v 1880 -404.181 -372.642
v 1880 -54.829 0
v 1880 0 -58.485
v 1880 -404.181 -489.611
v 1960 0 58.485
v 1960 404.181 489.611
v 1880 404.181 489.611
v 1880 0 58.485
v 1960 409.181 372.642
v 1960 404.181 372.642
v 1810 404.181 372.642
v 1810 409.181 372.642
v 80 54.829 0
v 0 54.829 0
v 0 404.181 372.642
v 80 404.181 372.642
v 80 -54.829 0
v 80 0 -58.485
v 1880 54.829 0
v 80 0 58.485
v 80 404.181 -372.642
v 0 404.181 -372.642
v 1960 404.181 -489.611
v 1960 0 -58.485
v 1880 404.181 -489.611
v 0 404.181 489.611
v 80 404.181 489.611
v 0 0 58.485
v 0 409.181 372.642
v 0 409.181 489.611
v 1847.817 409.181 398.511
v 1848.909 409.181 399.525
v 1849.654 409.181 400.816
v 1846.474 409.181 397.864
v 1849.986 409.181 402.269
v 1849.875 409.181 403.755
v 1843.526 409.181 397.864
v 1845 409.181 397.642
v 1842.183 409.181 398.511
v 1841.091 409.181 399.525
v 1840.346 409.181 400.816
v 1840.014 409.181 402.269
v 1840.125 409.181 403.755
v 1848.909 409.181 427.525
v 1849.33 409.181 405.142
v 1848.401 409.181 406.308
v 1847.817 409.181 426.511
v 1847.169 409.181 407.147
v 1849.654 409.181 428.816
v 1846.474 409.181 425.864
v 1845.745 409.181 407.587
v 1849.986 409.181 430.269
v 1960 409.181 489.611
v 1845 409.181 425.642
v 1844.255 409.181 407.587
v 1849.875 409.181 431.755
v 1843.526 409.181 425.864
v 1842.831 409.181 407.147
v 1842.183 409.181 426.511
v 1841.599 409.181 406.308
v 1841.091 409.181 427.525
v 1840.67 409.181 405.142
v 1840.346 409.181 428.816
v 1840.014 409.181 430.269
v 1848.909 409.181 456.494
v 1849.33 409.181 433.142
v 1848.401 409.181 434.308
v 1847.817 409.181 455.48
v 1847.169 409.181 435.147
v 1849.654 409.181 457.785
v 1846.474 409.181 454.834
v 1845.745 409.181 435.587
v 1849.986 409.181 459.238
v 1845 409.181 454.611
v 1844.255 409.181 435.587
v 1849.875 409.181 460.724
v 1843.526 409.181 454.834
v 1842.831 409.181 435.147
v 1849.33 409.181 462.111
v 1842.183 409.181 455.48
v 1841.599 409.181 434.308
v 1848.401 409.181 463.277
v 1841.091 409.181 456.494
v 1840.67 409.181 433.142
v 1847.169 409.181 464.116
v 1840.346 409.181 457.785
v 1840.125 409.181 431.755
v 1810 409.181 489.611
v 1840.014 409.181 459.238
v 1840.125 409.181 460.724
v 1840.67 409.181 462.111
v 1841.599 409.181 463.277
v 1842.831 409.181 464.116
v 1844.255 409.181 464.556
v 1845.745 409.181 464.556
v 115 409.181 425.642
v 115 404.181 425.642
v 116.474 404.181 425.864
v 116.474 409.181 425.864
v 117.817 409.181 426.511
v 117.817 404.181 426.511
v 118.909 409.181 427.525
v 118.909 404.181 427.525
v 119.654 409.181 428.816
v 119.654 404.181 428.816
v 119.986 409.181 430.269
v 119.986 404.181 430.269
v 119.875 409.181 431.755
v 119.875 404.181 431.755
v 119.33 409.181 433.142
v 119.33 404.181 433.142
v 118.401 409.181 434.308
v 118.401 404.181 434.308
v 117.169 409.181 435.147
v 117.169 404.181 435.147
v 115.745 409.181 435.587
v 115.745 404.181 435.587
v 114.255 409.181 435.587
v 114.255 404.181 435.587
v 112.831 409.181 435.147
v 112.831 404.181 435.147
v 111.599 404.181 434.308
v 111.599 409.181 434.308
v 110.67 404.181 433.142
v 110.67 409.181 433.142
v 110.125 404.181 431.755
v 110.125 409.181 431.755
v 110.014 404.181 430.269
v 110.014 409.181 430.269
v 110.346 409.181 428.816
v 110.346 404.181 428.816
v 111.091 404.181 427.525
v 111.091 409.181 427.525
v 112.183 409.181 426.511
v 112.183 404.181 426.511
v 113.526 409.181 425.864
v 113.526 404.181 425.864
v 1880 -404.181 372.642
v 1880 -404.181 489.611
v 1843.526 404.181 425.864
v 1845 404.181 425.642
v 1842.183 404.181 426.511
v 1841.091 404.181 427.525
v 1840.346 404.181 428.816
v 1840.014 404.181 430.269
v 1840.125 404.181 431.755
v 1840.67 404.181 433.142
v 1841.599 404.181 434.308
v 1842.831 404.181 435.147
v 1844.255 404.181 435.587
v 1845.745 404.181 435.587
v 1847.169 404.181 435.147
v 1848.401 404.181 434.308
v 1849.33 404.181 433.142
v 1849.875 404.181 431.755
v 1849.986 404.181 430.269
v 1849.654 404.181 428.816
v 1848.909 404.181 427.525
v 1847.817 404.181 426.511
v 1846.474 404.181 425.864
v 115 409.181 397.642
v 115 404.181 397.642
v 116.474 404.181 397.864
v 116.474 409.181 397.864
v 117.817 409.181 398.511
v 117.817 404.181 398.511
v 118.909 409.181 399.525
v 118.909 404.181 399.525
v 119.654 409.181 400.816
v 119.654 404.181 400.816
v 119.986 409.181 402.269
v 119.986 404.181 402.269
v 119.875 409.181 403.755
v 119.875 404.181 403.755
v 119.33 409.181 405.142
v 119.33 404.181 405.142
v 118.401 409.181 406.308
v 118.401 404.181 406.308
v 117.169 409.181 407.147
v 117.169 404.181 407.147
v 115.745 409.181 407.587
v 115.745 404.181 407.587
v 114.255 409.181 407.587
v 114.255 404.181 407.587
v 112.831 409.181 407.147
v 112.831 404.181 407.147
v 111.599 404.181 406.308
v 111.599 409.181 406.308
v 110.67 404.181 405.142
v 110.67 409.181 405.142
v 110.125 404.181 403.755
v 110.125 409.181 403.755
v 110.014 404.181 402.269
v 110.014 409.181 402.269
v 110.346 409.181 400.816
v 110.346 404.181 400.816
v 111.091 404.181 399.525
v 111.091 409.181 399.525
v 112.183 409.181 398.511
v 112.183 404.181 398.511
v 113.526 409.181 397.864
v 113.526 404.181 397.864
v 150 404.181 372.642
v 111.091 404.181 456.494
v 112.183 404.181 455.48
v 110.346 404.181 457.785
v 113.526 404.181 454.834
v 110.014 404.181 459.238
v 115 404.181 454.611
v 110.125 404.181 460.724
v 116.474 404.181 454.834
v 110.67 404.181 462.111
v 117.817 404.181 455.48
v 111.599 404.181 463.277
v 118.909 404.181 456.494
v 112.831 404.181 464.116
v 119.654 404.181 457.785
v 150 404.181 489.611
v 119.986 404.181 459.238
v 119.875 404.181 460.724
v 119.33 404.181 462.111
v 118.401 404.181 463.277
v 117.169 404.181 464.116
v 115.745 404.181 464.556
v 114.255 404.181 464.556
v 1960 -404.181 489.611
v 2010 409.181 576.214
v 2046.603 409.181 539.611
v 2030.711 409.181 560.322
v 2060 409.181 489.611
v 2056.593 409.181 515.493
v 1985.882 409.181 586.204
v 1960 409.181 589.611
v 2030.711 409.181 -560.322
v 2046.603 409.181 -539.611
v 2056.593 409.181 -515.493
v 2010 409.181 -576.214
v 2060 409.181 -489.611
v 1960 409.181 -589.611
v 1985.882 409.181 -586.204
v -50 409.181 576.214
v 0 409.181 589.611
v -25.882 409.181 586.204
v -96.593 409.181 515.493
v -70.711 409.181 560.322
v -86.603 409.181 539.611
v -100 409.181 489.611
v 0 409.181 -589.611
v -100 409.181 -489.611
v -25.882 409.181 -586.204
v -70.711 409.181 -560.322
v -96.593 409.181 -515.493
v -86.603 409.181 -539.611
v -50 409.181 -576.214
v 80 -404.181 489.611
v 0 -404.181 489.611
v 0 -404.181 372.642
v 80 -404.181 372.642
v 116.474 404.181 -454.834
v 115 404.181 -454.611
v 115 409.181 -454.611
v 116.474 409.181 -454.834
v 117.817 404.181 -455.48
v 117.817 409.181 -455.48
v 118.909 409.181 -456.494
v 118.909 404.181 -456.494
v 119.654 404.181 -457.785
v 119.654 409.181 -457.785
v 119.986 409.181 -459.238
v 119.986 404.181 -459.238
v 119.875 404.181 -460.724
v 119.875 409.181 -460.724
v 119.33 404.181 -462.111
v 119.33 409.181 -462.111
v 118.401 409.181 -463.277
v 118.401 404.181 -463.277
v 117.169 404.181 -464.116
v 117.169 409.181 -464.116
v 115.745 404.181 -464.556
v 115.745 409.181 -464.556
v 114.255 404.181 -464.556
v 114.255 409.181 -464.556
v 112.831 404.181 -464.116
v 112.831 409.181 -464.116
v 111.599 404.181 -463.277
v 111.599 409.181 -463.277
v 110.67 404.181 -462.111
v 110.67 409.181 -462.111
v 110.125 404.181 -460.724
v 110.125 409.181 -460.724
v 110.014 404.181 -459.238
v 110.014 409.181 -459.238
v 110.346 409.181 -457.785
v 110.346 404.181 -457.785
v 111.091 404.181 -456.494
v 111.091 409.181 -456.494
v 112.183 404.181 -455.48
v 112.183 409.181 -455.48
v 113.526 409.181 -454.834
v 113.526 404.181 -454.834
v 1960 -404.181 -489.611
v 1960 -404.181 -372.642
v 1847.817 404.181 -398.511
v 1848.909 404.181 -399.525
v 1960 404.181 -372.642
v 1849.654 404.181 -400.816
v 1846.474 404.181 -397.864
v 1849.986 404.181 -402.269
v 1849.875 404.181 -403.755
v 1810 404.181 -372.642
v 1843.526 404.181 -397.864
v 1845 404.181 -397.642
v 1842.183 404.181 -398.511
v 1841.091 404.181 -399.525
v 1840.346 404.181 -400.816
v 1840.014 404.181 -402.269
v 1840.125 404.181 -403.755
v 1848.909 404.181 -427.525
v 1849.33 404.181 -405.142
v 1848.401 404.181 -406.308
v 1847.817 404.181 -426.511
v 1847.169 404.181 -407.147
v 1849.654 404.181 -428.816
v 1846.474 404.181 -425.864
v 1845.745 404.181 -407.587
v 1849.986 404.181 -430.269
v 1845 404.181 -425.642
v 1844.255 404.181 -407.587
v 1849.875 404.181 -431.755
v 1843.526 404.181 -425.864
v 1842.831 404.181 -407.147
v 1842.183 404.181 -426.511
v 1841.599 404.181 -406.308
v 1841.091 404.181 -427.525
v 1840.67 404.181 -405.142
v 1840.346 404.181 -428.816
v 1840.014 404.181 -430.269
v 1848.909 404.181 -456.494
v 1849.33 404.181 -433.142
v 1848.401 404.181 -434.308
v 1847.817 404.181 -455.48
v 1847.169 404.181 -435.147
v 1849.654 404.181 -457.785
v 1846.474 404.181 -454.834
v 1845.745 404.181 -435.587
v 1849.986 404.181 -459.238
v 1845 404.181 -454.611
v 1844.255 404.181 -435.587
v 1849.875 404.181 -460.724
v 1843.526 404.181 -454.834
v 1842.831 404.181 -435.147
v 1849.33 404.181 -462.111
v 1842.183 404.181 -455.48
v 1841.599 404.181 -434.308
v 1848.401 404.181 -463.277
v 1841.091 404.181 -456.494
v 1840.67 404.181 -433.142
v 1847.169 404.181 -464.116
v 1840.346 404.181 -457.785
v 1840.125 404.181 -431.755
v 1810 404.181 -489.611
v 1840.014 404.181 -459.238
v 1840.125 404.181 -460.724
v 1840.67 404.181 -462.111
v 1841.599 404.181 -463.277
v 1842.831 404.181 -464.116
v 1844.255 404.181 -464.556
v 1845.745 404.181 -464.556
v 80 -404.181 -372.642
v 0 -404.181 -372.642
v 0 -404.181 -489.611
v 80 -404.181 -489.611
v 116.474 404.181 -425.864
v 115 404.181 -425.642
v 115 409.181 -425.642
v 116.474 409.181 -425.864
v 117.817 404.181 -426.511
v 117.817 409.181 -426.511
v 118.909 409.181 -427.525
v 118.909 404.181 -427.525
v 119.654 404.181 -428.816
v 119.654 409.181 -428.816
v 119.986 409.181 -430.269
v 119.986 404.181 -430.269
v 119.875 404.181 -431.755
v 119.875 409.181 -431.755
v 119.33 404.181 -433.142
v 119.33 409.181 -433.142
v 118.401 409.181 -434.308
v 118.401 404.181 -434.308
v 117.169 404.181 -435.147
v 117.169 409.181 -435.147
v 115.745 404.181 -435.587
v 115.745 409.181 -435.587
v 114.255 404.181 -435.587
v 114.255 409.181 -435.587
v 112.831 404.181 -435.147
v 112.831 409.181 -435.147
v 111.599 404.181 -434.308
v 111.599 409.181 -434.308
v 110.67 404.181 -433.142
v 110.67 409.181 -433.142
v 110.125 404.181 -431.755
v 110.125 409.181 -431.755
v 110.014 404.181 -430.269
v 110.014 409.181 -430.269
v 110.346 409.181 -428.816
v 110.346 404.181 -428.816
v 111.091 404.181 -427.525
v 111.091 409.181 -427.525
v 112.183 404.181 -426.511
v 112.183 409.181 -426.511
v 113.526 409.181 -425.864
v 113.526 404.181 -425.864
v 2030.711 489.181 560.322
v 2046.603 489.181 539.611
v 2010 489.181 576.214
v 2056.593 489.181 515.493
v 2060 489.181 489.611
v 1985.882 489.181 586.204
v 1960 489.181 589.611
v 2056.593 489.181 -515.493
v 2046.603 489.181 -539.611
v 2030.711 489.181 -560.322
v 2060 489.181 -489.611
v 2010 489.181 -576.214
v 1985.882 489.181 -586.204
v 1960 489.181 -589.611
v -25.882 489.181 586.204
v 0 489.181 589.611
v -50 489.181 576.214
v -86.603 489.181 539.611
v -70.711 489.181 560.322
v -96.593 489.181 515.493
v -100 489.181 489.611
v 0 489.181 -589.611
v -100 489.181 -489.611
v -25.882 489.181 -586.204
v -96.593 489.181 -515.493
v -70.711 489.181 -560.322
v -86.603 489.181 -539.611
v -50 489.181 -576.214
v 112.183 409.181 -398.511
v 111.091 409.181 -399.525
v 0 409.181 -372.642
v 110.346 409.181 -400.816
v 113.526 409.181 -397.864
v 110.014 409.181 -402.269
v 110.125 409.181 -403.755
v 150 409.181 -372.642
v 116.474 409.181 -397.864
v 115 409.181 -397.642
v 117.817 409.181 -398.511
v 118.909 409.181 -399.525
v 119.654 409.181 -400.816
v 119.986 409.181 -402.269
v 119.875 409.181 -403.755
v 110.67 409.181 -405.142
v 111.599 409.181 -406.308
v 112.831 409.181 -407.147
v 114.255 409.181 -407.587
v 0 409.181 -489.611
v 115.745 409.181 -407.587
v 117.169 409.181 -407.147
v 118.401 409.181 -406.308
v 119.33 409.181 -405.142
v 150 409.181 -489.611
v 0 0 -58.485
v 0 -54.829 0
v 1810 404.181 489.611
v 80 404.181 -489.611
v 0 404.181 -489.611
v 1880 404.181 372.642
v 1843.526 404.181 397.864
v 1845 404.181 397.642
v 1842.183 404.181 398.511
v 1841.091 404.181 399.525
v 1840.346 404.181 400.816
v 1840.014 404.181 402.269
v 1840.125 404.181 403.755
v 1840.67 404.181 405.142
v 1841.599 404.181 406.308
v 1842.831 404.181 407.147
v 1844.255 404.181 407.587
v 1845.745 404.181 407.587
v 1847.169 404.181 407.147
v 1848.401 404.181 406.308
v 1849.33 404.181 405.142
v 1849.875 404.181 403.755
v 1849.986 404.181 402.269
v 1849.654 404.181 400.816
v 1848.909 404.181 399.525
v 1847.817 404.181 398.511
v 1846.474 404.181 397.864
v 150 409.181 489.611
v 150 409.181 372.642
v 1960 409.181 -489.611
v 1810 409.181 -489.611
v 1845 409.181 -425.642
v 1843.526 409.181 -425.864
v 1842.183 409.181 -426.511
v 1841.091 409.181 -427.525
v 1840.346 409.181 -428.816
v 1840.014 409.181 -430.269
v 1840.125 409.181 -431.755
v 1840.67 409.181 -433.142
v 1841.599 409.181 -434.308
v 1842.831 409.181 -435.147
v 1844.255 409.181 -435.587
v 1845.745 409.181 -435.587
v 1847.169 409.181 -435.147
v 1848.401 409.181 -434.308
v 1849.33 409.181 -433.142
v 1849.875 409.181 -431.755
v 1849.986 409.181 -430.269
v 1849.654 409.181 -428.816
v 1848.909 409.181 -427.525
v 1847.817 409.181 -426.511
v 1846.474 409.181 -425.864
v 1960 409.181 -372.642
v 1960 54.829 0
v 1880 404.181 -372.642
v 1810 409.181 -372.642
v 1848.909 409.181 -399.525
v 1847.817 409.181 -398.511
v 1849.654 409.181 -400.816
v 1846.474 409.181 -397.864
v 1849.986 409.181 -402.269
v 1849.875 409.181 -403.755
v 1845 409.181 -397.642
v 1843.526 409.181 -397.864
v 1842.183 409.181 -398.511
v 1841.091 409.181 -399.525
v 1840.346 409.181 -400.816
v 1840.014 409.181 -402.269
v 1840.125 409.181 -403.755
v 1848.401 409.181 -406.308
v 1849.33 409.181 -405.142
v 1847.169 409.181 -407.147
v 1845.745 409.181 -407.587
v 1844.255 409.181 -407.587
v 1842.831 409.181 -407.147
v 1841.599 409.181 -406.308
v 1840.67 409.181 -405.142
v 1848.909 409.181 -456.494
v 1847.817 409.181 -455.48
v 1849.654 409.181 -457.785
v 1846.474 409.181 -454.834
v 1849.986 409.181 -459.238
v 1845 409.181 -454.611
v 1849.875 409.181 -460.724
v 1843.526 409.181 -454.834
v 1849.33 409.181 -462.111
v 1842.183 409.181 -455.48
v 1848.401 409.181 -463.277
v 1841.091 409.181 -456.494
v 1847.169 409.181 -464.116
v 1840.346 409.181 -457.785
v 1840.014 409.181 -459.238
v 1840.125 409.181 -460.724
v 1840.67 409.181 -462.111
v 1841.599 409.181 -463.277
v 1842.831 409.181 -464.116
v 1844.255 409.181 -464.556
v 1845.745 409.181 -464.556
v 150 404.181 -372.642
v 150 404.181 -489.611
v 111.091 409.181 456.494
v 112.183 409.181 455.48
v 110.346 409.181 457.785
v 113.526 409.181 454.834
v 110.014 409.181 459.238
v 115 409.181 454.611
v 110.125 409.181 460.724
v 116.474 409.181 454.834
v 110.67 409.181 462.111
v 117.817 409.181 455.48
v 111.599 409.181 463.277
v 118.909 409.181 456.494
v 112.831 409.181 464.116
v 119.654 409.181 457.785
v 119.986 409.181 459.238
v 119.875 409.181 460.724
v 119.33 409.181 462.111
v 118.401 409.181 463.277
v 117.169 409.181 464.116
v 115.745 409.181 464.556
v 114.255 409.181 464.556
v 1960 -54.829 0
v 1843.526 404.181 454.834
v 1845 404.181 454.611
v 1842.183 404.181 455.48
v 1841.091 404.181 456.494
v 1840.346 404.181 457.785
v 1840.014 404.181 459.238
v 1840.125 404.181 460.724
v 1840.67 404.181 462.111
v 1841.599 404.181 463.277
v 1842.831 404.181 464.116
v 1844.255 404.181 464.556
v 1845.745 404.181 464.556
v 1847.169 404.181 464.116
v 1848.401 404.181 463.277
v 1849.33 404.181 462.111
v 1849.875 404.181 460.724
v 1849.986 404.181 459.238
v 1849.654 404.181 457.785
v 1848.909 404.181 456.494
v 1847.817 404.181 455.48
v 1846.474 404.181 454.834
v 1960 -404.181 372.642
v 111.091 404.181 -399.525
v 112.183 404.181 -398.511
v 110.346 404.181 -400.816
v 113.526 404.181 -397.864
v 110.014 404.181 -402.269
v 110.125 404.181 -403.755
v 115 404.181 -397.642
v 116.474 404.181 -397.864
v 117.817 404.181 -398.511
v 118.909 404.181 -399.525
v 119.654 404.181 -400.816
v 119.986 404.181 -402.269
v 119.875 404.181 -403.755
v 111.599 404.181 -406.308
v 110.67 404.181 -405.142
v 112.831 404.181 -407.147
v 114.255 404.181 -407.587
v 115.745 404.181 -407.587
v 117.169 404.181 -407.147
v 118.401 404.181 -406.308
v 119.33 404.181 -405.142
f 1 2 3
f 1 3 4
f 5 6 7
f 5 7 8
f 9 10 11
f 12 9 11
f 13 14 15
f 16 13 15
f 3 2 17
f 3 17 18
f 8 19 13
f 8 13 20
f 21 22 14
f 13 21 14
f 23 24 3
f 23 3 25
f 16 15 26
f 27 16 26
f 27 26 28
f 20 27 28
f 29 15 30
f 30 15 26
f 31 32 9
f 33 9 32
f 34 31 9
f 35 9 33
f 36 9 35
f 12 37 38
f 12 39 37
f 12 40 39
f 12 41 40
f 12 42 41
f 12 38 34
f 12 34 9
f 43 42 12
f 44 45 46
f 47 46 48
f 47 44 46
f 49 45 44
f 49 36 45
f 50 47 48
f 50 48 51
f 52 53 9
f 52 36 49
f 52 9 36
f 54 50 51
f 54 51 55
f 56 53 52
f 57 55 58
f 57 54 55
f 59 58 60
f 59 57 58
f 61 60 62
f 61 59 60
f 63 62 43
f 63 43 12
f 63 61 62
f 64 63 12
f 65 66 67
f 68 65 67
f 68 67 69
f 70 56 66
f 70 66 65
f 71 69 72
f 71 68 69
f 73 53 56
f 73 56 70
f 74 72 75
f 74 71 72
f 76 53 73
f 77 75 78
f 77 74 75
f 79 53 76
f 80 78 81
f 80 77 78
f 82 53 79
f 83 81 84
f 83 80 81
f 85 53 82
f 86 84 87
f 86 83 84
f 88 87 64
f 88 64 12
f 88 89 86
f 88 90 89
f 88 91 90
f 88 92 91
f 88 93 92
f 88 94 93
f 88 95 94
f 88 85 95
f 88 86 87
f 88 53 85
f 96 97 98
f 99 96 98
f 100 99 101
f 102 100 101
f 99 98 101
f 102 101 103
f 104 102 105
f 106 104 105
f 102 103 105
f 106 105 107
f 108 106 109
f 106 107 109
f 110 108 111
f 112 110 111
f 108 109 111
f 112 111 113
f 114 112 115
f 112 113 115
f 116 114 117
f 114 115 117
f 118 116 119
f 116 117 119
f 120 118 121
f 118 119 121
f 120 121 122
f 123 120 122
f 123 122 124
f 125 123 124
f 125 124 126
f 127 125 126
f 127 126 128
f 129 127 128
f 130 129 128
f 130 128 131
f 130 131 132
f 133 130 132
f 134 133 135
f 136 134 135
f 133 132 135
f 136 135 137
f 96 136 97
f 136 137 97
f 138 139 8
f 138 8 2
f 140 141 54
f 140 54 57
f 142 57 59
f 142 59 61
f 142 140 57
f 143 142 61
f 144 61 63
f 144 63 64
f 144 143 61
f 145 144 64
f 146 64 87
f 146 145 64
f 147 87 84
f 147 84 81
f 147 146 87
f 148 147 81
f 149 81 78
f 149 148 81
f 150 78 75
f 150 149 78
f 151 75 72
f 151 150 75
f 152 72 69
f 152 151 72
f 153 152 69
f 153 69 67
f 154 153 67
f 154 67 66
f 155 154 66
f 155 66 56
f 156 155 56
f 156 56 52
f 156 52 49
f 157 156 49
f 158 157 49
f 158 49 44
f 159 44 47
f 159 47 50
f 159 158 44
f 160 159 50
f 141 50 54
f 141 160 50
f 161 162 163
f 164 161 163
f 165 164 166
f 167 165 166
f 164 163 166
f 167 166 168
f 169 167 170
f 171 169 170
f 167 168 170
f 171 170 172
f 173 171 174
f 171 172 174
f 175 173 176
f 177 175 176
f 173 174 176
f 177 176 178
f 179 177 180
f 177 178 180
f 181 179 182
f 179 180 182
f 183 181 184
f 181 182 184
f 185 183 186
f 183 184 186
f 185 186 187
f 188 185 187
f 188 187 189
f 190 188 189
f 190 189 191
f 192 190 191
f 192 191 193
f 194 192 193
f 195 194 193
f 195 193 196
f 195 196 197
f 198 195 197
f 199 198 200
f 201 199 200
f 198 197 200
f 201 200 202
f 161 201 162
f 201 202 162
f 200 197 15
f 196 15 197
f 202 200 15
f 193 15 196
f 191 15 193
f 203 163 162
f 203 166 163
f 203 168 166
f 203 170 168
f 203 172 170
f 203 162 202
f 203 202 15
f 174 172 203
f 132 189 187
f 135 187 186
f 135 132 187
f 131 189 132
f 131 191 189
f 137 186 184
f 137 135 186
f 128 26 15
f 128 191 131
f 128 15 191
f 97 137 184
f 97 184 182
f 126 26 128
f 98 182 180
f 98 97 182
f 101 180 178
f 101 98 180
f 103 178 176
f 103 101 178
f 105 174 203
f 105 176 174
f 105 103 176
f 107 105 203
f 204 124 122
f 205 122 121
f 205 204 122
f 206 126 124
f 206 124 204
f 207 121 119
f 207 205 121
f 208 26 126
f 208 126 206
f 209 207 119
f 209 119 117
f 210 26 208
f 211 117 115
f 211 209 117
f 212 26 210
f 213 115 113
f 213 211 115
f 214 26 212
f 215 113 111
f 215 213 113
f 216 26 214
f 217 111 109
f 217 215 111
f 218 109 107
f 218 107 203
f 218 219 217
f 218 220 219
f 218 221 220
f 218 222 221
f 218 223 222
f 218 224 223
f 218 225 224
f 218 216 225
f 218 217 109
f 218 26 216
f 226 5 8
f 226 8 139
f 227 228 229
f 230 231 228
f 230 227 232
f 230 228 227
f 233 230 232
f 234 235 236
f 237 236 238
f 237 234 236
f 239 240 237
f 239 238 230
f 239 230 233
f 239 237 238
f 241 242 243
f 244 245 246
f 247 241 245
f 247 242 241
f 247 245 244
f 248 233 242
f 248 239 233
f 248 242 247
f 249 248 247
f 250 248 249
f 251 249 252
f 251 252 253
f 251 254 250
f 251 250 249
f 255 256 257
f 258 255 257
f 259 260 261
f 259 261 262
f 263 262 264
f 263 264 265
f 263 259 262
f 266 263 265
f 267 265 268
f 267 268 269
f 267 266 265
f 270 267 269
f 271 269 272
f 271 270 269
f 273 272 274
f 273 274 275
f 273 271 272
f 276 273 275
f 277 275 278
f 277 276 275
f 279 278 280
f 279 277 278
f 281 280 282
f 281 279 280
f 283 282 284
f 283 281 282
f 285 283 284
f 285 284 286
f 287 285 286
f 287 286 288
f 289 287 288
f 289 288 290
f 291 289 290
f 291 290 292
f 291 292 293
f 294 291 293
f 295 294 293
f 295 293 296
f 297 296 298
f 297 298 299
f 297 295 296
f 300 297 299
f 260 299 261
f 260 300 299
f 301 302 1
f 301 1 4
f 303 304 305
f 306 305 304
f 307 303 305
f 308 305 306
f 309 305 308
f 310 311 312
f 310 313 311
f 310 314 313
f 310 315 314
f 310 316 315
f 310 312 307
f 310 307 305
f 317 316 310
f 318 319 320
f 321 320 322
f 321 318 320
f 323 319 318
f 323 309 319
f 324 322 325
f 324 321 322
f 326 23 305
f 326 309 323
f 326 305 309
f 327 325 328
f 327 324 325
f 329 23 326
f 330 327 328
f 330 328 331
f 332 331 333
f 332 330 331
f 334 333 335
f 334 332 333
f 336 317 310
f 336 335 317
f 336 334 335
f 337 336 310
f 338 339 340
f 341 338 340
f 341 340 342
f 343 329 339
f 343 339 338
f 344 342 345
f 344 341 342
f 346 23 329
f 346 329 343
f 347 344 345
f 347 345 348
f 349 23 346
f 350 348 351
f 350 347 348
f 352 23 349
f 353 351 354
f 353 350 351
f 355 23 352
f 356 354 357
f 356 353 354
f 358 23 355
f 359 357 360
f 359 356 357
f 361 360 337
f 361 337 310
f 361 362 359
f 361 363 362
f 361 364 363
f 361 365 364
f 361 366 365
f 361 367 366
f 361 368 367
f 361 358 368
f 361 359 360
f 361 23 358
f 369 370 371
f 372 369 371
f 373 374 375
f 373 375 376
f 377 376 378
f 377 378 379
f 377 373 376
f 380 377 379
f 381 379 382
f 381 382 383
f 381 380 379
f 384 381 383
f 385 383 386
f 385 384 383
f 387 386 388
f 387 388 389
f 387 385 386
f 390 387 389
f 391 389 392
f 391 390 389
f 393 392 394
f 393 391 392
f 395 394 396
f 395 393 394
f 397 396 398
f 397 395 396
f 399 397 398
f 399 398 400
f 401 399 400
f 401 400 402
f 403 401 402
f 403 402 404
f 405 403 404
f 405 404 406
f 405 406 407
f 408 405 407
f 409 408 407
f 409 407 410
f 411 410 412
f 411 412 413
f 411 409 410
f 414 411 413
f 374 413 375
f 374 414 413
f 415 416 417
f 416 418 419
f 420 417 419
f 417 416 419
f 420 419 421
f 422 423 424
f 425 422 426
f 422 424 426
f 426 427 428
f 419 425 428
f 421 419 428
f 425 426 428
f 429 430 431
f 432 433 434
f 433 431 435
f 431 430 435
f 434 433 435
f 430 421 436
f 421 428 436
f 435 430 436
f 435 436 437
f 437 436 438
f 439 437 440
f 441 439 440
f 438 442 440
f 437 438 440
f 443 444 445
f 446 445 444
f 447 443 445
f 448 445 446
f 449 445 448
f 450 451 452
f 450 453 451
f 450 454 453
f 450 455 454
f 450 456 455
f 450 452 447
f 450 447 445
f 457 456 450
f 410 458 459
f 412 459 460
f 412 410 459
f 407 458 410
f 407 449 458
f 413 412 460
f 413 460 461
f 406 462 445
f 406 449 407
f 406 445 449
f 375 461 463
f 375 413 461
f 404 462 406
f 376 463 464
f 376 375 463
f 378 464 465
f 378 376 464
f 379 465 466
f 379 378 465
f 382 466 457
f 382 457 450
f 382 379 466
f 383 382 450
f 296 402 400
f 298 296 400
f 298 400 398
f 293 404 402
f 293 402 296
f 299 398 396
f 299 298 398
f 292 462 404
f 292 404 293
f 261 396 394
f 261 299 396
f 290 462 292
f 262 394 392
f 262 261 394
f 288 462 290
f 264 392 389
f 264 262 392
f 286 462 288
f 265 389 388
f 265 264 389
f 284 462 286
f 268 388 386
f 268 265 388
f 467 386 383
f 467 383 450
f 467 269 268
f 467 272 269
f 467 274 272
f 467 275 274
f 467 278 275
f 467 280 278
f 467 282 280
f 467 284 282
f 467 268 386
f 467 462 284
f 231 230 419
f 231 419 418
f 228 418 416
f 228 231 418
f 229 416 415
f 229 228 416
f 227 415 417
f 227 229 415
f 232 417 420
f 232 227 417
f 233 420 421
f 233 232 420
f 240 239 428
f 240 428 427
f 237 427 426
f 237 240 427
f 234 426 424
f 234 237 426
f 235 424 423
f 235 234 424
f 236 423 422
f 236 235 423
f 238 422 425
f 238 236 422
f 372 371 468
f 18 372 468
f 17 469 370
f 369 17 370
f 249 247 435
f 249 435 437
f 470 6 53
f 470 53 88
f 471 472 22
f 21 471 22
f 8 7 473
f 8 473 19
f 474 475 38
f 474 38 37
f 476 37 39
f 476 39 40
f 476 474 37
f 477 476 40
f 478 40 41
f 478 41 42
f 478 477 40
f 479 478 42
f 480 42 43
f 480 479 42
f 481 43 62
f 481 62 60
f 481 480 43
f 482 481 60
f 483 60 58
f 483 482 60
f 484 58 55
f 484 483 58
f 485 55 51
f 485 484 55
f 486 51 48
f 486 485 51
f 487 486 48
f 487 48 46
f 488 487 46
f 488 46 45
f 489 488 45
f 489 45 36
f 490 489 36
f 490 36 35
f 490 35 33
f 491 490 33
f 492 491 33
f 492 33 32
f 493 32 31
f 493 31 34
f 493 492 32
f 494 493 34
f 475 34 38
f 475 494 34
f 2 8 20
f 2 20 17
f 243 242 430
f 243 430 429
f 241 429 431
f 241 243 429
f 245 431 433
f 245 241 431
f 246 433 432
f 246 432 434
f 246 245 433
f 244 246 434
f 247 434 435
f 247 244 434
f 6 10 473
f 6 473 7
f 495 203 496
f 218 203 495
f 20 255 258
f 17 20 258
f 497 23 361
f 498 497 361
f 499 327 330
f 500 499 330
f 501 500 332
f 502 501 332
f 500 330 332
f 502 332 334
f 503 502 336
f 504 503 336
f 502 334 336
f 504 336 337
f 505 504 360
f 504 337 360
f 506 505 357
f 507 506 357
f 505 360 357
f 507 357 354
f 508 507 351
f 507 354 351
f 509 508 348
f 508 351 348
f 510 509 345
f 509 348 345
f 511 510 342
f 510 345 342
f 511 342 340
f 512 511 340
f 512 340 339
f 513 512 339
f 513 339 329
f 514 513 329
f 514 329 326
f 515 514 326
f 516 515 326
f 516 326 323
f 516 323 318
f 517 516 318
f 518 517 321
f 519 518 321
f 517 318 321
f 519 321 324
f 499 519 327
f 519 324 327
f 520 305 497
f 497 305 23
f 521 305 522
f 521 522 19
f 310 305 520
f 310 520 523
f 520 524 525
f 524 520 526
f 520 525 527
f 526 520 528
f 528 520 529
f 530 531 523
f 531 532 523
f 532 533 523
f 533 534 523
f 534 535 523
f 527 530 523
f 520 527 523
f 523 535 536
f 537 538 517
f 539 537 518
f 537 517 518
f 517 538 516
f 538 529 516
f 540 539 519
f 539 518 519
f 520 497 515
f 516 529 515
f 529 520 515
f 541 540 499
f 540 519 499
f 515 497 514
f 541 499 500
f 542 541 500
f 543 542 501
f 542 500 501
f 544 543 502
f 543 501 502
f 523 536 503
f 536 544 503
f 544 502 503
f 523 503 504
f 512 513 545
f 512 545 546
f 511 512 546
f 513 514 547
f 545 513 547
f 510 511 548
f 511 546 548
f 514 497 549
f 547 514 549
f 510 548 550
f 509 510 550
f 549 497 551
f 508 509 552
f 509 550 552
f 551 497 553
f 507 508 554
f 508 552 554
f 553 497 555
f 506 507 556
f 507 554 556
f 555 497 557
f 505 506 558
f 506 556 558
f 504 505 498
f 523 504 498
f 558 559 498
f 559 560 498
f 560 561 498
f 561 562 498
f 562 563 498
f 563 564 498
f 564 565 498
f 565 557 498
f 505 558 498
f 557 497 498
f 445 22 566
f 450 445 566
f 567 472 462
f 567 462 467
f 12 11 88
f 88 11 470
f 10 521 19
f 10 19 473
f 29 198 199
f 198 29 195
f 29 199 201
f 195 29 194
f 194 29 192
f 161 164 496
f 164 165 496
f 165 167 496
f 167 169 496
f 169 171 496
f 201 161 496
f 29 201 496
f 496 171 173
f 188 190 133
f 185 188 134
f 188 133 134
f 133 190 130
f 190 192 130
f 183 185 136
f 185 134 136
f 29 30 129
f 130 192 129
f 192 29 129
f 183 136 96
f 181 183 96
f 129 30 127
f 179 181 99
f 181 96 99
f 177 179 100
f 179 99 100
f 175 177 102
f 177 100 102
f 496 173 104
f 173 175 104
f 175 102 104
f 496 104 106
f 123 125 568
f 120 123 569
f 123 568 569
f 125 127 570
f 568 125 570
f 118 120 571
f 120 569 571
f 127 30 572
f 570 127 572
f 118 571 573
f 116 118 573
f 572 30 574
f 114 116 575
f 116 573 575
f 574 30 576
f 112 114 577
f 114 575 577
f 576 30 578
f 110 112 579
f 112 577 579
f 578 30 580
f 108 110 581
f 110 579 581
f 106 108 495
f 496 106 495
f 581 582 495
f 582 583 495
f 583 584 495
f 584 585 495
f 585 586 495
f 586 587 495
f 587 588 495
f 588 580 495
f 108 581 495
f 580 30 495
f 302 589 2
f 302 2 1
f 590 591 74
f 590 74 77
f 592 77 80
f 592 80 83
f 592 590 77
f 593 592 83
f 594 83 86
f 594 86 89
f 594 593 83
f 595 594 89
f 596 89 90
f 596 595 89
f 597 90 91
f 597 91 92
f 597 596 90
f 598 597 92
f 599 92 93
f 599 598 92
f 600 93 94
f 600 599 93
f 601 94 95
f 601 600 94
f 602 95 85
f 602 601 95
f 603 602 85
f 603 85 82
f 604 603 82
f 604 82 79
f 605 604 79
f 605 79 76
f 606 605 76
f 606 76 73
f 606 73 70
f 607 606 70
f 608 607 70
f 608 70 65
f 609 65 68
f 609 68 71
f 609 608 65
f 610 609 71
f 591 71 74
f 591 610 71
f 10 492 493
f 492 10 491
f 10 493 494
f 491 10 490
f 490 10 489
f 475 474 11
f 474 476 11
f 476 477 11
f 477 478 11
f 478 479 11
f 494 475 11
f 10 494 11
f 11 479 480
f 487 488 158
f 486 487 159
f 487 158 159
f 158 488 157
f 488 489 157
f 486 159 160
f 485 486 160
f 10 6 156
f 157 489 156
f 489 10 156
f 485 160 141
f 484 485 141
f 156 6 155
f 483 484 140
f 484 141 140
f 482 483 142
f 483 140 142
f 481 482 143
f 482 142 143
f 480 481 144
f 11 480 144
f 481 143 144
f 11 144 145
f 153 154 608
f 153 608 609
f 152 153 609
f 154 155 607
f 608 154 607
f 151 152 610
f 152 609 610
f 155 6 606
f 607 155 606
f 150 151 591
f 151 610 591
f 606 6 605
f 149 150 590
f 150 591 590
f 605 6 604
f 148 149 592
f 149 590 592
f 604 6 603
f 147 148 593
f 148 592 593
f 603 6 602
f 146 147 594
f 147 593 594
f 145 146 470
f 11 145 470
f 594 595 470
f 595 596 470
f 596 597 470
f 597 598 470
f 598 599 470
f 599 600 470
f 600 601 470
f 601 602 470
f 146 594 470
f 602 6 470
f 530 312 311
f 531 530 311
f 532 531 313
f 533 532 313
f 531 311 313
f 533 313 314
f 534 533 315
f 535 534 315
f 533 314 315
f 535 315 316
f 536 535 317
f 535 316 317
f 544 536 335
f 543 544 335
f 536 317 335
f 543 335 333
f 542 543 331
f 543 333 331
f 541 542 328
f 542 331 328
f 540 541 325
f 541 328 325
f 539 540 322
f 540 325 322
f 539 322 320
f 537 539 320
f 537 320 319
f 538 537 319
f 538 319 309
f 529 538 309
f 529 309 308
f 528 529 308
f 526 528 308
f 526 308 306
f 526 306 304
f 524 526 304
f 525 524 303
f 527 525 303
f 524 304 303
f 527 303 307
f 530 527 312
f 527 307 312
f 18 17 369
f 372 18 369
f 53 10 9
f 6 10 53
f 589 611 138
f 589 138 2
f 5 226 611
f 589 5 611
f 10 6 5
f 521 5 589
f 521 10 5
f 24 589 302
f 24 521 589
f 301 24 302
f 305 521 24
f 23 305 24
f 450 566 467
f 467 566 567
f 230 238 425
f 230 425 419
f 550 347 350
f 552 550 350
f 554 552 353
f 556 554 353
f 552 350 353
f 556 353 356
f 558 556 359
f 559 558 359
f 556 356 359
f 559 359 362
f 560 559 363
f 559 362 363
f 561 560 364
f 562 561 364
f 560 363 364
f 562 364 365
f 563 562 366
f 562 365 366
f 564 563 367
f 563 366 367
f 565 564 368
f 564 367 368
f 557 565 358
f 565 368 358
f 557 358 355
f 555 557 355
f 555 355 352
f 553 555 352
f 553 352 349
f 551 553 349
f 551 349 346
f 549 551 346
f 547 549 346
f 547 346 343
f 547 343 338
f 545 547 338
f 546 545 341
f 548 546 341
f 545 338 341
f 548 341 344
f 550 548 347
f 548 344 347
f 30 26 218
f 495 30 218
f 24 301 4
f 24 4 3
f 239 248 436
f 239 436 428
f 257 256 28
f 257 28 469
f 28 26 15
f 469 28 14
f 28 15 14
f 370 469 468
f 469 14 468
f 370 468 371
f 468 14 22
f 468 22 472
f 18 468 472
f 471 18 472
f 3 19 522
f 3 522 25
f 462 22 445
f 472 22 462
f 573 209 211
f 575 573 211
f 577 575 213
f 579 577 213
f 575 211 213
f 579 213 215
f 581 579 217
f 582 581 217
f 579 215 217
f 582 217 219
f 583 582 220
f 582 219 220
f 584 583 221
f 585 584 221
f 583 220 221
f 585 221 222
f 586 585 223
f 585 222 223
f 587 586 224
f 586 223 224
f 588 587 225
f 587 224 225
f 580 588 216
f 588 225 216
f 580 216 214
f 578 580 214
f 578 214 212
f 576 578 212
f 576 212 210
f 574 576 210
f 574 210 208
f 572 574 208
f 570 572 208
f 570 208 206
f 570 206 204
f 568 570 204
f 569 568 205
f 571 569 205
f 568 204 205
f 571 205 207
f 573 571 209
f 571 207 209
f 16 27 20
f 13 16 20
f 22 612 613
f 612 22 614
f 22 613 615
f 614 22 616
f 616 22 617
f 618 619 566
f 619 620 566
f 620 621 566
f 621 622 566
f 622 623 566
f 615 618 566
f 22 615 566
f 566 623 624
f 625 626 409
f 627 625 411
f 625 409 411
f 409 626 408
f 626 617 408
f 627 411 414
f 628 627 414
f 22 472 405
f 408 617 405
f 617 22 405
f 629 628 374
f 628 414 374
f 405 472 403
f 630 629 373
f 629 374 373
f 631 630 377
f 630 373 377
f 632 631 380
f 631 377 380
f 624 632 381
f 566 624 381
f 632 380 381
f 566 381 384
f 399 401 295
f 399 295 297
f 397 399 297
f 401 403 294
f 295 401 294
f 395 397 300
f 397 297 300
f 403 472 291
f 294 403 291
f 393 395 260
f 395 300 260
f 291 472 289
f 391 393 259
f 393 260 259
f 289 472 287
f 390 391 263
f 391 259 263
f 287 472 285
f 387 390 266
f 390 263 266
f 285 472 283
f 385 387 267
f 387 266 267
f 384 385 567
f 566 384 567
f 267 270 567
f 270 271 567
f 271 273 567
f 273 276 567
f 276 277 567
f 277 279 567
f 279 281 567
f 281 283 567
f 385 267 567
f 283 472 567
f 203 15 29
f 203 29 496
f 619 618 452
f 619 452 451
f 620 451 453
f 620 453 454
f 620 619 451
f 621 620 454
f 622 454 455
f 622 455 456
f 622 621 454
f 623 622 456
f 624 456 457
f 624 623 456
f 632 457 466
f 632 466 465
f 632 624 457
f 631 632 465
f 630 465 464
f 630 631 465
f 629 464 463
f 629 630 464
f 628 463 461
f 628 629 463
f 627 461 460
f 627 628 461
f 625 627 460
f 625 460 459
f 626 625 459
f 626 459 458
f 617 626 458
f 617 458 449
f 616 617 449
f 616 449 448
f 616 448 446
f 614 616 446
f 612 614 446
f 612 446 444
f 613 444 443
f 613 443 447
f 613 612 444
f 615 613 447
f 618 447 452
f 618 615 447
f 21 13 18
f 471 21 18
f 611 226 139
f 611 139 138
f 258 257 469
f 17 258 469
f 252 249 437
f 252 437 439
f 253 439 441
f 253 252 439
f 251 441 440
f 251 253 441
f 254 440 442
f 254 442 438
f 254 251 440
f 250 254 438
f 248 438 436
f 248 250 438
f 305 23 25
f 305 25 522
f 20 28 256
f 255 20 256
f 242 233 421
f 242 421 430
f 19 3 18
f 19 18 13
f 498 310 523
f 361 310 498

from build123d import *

# Parameters (mm, degrees)
BOSS_EXTRUDE1_DEPTH = 80
SKETCH2_W           = 150
SKETCH2_H           = 116.96913173
SKETCH2_R           = 5
BASE_FLANGE1_DEPTH  = 5
BOSS_EXTRUDE2_START = -80
BOSS_EXTRUDE2_DEPTH = 1800
BOSS_EXTRUDE3_DEPTH = 80


# Sheet-metal steps are written as plain solids
with BuildPart() as part:
    # Sketch1 → Boss-Extrude1 (new body)
    with BuildSketch(Plane(origin=(0, 0, 0), x_dir=(0, 0, -1), z_dir=(1, 0, 0))):
        Polygon((-372.642354845, -404.181488166), (0, -54.829280499), (372.642354845, -404.181488166), (489.611486575, -404.181488166), (58.484565865, 0), (489.611486575, 404.181488166), (372.642354845, 404.181488166), (0, 54.829280499), (-372.642354845, 404.181488166), (-489.611486575, 404.181488166), (-58.484565865, 0), (-489.611486575, -404.181488166), align=None)
    extrude(amount=BOSS_EXTRUDE1_DEPTH)


with BuildPart() as body_2:
    # Mirror2: mirrored copy
    add(part.part.mirror(Plane(origin=(980, 0, 0), x_dir=(0, 0, 1), z_dir=(1, 0, 0))))


with BuildPart() as body_3:
    # Sketch2 → Base-Flange1 (new body)
    with BuildSketch(Plane(origin=(0, 404.181488166, 0), x_dir=(1, 0, 0), z_dir=(0, 1, 0))):
        with Locations((75, 431.12692071)):
            Rectangle(SKETCH2_W, SKETCH2_H)
        with Locations(Location((115, 459.611486575, 0), (0, 0, 270))):
            Circle(SKETCH2_R, mode=Mode.SUBTRACT)
        with Locations(Location((115, 430.642354845, 0), (0, 0, 270))):
            Circle(SKETCH2_R, mode=Mode.SUBTRACT)
        with Locations(Location((115, 402.642354845, 0), (0, 0, 270))):
            Circle(SKETCH2_R, mode=Mode.SUBTRACT)
    extrude(amount=BASE_FLANGE1_DEPTH)


with BuildPart() as body_4:
    # Mirror3: mirrored copy
    add(body_3.part.mirror(Plane(origin=(980, 0, 0), x_dir=(0, 0, 1), z_dir=(1, 0, 0))))


with BuildPart() as body_5:
    # Mirror4: mirrored copy
    add(body_4.part.mirror(Plane.XY))


with BuildPart() as body_6:
    # Mirror4 2: mirrored copy
    add(body_3.part.mirror(Plane.XY))


with BuildPart() as part_1:
    add(part.part)

    add(body_2.part)  # Boss-Extrude2 merges body 2
    # Sketch13 → Boss-Extrude2 (add)
    with BuildSketch(Plane(origin=(1960, 0, 0), x_dir=(0, 0, -1), z_dir=(1, 0, 0)).offset(BOSS_EXTRUDE2_START)):
        Polygon((0, 54.829280499), (-58.484565865, 0), (0, -54.829280499), (58.484565865, 0), align=None)
    extrude(amount=-BOSS_EXTRUDE2_DEPTH)


with BuildPart() as body_6_2:
    # Sketch14 → Boss-Extrude3 (new body)
    with BuildSketch(Plane(origin=(0, 409.181488166, 0), x_dir=(1, 0, 0), z_dir=(0, 1, 0))):
        with BuildLine():
            Line((0, 589.611486575), (1960, 589.611486575))
            ThreePointArc((1960, 589.611486575), (2030.710678119, 560.322164694), (2060, 489.611486575))
            Line((2060, 489.611486575), (2060, -489.611486575))
            ThreePointArc((2060, -489.611486575), (2030.710678119, -560.322164694), (1960, -589.611486575))
            Line((1960, -589.611486575), (0, -589.611486575))
            ThreePointArc((0, -589.611486575), (-70.710678119, -560.322164694), (-100, -489.611486575))
            Line((-100, -489.611486575), (-100, 489.611486575))
            ThreePointArc((-100, 489.611486575), (-70.710678119, 560.322164694), (0, 589.611486575))
        make_face()
    extrude(amount=BOSS_EXTRUDE3_DEPTH)


solid = Compound([body_3.part, body_4.part, body_5.part, body_6.part, part_1.part, body_6_2.part])
